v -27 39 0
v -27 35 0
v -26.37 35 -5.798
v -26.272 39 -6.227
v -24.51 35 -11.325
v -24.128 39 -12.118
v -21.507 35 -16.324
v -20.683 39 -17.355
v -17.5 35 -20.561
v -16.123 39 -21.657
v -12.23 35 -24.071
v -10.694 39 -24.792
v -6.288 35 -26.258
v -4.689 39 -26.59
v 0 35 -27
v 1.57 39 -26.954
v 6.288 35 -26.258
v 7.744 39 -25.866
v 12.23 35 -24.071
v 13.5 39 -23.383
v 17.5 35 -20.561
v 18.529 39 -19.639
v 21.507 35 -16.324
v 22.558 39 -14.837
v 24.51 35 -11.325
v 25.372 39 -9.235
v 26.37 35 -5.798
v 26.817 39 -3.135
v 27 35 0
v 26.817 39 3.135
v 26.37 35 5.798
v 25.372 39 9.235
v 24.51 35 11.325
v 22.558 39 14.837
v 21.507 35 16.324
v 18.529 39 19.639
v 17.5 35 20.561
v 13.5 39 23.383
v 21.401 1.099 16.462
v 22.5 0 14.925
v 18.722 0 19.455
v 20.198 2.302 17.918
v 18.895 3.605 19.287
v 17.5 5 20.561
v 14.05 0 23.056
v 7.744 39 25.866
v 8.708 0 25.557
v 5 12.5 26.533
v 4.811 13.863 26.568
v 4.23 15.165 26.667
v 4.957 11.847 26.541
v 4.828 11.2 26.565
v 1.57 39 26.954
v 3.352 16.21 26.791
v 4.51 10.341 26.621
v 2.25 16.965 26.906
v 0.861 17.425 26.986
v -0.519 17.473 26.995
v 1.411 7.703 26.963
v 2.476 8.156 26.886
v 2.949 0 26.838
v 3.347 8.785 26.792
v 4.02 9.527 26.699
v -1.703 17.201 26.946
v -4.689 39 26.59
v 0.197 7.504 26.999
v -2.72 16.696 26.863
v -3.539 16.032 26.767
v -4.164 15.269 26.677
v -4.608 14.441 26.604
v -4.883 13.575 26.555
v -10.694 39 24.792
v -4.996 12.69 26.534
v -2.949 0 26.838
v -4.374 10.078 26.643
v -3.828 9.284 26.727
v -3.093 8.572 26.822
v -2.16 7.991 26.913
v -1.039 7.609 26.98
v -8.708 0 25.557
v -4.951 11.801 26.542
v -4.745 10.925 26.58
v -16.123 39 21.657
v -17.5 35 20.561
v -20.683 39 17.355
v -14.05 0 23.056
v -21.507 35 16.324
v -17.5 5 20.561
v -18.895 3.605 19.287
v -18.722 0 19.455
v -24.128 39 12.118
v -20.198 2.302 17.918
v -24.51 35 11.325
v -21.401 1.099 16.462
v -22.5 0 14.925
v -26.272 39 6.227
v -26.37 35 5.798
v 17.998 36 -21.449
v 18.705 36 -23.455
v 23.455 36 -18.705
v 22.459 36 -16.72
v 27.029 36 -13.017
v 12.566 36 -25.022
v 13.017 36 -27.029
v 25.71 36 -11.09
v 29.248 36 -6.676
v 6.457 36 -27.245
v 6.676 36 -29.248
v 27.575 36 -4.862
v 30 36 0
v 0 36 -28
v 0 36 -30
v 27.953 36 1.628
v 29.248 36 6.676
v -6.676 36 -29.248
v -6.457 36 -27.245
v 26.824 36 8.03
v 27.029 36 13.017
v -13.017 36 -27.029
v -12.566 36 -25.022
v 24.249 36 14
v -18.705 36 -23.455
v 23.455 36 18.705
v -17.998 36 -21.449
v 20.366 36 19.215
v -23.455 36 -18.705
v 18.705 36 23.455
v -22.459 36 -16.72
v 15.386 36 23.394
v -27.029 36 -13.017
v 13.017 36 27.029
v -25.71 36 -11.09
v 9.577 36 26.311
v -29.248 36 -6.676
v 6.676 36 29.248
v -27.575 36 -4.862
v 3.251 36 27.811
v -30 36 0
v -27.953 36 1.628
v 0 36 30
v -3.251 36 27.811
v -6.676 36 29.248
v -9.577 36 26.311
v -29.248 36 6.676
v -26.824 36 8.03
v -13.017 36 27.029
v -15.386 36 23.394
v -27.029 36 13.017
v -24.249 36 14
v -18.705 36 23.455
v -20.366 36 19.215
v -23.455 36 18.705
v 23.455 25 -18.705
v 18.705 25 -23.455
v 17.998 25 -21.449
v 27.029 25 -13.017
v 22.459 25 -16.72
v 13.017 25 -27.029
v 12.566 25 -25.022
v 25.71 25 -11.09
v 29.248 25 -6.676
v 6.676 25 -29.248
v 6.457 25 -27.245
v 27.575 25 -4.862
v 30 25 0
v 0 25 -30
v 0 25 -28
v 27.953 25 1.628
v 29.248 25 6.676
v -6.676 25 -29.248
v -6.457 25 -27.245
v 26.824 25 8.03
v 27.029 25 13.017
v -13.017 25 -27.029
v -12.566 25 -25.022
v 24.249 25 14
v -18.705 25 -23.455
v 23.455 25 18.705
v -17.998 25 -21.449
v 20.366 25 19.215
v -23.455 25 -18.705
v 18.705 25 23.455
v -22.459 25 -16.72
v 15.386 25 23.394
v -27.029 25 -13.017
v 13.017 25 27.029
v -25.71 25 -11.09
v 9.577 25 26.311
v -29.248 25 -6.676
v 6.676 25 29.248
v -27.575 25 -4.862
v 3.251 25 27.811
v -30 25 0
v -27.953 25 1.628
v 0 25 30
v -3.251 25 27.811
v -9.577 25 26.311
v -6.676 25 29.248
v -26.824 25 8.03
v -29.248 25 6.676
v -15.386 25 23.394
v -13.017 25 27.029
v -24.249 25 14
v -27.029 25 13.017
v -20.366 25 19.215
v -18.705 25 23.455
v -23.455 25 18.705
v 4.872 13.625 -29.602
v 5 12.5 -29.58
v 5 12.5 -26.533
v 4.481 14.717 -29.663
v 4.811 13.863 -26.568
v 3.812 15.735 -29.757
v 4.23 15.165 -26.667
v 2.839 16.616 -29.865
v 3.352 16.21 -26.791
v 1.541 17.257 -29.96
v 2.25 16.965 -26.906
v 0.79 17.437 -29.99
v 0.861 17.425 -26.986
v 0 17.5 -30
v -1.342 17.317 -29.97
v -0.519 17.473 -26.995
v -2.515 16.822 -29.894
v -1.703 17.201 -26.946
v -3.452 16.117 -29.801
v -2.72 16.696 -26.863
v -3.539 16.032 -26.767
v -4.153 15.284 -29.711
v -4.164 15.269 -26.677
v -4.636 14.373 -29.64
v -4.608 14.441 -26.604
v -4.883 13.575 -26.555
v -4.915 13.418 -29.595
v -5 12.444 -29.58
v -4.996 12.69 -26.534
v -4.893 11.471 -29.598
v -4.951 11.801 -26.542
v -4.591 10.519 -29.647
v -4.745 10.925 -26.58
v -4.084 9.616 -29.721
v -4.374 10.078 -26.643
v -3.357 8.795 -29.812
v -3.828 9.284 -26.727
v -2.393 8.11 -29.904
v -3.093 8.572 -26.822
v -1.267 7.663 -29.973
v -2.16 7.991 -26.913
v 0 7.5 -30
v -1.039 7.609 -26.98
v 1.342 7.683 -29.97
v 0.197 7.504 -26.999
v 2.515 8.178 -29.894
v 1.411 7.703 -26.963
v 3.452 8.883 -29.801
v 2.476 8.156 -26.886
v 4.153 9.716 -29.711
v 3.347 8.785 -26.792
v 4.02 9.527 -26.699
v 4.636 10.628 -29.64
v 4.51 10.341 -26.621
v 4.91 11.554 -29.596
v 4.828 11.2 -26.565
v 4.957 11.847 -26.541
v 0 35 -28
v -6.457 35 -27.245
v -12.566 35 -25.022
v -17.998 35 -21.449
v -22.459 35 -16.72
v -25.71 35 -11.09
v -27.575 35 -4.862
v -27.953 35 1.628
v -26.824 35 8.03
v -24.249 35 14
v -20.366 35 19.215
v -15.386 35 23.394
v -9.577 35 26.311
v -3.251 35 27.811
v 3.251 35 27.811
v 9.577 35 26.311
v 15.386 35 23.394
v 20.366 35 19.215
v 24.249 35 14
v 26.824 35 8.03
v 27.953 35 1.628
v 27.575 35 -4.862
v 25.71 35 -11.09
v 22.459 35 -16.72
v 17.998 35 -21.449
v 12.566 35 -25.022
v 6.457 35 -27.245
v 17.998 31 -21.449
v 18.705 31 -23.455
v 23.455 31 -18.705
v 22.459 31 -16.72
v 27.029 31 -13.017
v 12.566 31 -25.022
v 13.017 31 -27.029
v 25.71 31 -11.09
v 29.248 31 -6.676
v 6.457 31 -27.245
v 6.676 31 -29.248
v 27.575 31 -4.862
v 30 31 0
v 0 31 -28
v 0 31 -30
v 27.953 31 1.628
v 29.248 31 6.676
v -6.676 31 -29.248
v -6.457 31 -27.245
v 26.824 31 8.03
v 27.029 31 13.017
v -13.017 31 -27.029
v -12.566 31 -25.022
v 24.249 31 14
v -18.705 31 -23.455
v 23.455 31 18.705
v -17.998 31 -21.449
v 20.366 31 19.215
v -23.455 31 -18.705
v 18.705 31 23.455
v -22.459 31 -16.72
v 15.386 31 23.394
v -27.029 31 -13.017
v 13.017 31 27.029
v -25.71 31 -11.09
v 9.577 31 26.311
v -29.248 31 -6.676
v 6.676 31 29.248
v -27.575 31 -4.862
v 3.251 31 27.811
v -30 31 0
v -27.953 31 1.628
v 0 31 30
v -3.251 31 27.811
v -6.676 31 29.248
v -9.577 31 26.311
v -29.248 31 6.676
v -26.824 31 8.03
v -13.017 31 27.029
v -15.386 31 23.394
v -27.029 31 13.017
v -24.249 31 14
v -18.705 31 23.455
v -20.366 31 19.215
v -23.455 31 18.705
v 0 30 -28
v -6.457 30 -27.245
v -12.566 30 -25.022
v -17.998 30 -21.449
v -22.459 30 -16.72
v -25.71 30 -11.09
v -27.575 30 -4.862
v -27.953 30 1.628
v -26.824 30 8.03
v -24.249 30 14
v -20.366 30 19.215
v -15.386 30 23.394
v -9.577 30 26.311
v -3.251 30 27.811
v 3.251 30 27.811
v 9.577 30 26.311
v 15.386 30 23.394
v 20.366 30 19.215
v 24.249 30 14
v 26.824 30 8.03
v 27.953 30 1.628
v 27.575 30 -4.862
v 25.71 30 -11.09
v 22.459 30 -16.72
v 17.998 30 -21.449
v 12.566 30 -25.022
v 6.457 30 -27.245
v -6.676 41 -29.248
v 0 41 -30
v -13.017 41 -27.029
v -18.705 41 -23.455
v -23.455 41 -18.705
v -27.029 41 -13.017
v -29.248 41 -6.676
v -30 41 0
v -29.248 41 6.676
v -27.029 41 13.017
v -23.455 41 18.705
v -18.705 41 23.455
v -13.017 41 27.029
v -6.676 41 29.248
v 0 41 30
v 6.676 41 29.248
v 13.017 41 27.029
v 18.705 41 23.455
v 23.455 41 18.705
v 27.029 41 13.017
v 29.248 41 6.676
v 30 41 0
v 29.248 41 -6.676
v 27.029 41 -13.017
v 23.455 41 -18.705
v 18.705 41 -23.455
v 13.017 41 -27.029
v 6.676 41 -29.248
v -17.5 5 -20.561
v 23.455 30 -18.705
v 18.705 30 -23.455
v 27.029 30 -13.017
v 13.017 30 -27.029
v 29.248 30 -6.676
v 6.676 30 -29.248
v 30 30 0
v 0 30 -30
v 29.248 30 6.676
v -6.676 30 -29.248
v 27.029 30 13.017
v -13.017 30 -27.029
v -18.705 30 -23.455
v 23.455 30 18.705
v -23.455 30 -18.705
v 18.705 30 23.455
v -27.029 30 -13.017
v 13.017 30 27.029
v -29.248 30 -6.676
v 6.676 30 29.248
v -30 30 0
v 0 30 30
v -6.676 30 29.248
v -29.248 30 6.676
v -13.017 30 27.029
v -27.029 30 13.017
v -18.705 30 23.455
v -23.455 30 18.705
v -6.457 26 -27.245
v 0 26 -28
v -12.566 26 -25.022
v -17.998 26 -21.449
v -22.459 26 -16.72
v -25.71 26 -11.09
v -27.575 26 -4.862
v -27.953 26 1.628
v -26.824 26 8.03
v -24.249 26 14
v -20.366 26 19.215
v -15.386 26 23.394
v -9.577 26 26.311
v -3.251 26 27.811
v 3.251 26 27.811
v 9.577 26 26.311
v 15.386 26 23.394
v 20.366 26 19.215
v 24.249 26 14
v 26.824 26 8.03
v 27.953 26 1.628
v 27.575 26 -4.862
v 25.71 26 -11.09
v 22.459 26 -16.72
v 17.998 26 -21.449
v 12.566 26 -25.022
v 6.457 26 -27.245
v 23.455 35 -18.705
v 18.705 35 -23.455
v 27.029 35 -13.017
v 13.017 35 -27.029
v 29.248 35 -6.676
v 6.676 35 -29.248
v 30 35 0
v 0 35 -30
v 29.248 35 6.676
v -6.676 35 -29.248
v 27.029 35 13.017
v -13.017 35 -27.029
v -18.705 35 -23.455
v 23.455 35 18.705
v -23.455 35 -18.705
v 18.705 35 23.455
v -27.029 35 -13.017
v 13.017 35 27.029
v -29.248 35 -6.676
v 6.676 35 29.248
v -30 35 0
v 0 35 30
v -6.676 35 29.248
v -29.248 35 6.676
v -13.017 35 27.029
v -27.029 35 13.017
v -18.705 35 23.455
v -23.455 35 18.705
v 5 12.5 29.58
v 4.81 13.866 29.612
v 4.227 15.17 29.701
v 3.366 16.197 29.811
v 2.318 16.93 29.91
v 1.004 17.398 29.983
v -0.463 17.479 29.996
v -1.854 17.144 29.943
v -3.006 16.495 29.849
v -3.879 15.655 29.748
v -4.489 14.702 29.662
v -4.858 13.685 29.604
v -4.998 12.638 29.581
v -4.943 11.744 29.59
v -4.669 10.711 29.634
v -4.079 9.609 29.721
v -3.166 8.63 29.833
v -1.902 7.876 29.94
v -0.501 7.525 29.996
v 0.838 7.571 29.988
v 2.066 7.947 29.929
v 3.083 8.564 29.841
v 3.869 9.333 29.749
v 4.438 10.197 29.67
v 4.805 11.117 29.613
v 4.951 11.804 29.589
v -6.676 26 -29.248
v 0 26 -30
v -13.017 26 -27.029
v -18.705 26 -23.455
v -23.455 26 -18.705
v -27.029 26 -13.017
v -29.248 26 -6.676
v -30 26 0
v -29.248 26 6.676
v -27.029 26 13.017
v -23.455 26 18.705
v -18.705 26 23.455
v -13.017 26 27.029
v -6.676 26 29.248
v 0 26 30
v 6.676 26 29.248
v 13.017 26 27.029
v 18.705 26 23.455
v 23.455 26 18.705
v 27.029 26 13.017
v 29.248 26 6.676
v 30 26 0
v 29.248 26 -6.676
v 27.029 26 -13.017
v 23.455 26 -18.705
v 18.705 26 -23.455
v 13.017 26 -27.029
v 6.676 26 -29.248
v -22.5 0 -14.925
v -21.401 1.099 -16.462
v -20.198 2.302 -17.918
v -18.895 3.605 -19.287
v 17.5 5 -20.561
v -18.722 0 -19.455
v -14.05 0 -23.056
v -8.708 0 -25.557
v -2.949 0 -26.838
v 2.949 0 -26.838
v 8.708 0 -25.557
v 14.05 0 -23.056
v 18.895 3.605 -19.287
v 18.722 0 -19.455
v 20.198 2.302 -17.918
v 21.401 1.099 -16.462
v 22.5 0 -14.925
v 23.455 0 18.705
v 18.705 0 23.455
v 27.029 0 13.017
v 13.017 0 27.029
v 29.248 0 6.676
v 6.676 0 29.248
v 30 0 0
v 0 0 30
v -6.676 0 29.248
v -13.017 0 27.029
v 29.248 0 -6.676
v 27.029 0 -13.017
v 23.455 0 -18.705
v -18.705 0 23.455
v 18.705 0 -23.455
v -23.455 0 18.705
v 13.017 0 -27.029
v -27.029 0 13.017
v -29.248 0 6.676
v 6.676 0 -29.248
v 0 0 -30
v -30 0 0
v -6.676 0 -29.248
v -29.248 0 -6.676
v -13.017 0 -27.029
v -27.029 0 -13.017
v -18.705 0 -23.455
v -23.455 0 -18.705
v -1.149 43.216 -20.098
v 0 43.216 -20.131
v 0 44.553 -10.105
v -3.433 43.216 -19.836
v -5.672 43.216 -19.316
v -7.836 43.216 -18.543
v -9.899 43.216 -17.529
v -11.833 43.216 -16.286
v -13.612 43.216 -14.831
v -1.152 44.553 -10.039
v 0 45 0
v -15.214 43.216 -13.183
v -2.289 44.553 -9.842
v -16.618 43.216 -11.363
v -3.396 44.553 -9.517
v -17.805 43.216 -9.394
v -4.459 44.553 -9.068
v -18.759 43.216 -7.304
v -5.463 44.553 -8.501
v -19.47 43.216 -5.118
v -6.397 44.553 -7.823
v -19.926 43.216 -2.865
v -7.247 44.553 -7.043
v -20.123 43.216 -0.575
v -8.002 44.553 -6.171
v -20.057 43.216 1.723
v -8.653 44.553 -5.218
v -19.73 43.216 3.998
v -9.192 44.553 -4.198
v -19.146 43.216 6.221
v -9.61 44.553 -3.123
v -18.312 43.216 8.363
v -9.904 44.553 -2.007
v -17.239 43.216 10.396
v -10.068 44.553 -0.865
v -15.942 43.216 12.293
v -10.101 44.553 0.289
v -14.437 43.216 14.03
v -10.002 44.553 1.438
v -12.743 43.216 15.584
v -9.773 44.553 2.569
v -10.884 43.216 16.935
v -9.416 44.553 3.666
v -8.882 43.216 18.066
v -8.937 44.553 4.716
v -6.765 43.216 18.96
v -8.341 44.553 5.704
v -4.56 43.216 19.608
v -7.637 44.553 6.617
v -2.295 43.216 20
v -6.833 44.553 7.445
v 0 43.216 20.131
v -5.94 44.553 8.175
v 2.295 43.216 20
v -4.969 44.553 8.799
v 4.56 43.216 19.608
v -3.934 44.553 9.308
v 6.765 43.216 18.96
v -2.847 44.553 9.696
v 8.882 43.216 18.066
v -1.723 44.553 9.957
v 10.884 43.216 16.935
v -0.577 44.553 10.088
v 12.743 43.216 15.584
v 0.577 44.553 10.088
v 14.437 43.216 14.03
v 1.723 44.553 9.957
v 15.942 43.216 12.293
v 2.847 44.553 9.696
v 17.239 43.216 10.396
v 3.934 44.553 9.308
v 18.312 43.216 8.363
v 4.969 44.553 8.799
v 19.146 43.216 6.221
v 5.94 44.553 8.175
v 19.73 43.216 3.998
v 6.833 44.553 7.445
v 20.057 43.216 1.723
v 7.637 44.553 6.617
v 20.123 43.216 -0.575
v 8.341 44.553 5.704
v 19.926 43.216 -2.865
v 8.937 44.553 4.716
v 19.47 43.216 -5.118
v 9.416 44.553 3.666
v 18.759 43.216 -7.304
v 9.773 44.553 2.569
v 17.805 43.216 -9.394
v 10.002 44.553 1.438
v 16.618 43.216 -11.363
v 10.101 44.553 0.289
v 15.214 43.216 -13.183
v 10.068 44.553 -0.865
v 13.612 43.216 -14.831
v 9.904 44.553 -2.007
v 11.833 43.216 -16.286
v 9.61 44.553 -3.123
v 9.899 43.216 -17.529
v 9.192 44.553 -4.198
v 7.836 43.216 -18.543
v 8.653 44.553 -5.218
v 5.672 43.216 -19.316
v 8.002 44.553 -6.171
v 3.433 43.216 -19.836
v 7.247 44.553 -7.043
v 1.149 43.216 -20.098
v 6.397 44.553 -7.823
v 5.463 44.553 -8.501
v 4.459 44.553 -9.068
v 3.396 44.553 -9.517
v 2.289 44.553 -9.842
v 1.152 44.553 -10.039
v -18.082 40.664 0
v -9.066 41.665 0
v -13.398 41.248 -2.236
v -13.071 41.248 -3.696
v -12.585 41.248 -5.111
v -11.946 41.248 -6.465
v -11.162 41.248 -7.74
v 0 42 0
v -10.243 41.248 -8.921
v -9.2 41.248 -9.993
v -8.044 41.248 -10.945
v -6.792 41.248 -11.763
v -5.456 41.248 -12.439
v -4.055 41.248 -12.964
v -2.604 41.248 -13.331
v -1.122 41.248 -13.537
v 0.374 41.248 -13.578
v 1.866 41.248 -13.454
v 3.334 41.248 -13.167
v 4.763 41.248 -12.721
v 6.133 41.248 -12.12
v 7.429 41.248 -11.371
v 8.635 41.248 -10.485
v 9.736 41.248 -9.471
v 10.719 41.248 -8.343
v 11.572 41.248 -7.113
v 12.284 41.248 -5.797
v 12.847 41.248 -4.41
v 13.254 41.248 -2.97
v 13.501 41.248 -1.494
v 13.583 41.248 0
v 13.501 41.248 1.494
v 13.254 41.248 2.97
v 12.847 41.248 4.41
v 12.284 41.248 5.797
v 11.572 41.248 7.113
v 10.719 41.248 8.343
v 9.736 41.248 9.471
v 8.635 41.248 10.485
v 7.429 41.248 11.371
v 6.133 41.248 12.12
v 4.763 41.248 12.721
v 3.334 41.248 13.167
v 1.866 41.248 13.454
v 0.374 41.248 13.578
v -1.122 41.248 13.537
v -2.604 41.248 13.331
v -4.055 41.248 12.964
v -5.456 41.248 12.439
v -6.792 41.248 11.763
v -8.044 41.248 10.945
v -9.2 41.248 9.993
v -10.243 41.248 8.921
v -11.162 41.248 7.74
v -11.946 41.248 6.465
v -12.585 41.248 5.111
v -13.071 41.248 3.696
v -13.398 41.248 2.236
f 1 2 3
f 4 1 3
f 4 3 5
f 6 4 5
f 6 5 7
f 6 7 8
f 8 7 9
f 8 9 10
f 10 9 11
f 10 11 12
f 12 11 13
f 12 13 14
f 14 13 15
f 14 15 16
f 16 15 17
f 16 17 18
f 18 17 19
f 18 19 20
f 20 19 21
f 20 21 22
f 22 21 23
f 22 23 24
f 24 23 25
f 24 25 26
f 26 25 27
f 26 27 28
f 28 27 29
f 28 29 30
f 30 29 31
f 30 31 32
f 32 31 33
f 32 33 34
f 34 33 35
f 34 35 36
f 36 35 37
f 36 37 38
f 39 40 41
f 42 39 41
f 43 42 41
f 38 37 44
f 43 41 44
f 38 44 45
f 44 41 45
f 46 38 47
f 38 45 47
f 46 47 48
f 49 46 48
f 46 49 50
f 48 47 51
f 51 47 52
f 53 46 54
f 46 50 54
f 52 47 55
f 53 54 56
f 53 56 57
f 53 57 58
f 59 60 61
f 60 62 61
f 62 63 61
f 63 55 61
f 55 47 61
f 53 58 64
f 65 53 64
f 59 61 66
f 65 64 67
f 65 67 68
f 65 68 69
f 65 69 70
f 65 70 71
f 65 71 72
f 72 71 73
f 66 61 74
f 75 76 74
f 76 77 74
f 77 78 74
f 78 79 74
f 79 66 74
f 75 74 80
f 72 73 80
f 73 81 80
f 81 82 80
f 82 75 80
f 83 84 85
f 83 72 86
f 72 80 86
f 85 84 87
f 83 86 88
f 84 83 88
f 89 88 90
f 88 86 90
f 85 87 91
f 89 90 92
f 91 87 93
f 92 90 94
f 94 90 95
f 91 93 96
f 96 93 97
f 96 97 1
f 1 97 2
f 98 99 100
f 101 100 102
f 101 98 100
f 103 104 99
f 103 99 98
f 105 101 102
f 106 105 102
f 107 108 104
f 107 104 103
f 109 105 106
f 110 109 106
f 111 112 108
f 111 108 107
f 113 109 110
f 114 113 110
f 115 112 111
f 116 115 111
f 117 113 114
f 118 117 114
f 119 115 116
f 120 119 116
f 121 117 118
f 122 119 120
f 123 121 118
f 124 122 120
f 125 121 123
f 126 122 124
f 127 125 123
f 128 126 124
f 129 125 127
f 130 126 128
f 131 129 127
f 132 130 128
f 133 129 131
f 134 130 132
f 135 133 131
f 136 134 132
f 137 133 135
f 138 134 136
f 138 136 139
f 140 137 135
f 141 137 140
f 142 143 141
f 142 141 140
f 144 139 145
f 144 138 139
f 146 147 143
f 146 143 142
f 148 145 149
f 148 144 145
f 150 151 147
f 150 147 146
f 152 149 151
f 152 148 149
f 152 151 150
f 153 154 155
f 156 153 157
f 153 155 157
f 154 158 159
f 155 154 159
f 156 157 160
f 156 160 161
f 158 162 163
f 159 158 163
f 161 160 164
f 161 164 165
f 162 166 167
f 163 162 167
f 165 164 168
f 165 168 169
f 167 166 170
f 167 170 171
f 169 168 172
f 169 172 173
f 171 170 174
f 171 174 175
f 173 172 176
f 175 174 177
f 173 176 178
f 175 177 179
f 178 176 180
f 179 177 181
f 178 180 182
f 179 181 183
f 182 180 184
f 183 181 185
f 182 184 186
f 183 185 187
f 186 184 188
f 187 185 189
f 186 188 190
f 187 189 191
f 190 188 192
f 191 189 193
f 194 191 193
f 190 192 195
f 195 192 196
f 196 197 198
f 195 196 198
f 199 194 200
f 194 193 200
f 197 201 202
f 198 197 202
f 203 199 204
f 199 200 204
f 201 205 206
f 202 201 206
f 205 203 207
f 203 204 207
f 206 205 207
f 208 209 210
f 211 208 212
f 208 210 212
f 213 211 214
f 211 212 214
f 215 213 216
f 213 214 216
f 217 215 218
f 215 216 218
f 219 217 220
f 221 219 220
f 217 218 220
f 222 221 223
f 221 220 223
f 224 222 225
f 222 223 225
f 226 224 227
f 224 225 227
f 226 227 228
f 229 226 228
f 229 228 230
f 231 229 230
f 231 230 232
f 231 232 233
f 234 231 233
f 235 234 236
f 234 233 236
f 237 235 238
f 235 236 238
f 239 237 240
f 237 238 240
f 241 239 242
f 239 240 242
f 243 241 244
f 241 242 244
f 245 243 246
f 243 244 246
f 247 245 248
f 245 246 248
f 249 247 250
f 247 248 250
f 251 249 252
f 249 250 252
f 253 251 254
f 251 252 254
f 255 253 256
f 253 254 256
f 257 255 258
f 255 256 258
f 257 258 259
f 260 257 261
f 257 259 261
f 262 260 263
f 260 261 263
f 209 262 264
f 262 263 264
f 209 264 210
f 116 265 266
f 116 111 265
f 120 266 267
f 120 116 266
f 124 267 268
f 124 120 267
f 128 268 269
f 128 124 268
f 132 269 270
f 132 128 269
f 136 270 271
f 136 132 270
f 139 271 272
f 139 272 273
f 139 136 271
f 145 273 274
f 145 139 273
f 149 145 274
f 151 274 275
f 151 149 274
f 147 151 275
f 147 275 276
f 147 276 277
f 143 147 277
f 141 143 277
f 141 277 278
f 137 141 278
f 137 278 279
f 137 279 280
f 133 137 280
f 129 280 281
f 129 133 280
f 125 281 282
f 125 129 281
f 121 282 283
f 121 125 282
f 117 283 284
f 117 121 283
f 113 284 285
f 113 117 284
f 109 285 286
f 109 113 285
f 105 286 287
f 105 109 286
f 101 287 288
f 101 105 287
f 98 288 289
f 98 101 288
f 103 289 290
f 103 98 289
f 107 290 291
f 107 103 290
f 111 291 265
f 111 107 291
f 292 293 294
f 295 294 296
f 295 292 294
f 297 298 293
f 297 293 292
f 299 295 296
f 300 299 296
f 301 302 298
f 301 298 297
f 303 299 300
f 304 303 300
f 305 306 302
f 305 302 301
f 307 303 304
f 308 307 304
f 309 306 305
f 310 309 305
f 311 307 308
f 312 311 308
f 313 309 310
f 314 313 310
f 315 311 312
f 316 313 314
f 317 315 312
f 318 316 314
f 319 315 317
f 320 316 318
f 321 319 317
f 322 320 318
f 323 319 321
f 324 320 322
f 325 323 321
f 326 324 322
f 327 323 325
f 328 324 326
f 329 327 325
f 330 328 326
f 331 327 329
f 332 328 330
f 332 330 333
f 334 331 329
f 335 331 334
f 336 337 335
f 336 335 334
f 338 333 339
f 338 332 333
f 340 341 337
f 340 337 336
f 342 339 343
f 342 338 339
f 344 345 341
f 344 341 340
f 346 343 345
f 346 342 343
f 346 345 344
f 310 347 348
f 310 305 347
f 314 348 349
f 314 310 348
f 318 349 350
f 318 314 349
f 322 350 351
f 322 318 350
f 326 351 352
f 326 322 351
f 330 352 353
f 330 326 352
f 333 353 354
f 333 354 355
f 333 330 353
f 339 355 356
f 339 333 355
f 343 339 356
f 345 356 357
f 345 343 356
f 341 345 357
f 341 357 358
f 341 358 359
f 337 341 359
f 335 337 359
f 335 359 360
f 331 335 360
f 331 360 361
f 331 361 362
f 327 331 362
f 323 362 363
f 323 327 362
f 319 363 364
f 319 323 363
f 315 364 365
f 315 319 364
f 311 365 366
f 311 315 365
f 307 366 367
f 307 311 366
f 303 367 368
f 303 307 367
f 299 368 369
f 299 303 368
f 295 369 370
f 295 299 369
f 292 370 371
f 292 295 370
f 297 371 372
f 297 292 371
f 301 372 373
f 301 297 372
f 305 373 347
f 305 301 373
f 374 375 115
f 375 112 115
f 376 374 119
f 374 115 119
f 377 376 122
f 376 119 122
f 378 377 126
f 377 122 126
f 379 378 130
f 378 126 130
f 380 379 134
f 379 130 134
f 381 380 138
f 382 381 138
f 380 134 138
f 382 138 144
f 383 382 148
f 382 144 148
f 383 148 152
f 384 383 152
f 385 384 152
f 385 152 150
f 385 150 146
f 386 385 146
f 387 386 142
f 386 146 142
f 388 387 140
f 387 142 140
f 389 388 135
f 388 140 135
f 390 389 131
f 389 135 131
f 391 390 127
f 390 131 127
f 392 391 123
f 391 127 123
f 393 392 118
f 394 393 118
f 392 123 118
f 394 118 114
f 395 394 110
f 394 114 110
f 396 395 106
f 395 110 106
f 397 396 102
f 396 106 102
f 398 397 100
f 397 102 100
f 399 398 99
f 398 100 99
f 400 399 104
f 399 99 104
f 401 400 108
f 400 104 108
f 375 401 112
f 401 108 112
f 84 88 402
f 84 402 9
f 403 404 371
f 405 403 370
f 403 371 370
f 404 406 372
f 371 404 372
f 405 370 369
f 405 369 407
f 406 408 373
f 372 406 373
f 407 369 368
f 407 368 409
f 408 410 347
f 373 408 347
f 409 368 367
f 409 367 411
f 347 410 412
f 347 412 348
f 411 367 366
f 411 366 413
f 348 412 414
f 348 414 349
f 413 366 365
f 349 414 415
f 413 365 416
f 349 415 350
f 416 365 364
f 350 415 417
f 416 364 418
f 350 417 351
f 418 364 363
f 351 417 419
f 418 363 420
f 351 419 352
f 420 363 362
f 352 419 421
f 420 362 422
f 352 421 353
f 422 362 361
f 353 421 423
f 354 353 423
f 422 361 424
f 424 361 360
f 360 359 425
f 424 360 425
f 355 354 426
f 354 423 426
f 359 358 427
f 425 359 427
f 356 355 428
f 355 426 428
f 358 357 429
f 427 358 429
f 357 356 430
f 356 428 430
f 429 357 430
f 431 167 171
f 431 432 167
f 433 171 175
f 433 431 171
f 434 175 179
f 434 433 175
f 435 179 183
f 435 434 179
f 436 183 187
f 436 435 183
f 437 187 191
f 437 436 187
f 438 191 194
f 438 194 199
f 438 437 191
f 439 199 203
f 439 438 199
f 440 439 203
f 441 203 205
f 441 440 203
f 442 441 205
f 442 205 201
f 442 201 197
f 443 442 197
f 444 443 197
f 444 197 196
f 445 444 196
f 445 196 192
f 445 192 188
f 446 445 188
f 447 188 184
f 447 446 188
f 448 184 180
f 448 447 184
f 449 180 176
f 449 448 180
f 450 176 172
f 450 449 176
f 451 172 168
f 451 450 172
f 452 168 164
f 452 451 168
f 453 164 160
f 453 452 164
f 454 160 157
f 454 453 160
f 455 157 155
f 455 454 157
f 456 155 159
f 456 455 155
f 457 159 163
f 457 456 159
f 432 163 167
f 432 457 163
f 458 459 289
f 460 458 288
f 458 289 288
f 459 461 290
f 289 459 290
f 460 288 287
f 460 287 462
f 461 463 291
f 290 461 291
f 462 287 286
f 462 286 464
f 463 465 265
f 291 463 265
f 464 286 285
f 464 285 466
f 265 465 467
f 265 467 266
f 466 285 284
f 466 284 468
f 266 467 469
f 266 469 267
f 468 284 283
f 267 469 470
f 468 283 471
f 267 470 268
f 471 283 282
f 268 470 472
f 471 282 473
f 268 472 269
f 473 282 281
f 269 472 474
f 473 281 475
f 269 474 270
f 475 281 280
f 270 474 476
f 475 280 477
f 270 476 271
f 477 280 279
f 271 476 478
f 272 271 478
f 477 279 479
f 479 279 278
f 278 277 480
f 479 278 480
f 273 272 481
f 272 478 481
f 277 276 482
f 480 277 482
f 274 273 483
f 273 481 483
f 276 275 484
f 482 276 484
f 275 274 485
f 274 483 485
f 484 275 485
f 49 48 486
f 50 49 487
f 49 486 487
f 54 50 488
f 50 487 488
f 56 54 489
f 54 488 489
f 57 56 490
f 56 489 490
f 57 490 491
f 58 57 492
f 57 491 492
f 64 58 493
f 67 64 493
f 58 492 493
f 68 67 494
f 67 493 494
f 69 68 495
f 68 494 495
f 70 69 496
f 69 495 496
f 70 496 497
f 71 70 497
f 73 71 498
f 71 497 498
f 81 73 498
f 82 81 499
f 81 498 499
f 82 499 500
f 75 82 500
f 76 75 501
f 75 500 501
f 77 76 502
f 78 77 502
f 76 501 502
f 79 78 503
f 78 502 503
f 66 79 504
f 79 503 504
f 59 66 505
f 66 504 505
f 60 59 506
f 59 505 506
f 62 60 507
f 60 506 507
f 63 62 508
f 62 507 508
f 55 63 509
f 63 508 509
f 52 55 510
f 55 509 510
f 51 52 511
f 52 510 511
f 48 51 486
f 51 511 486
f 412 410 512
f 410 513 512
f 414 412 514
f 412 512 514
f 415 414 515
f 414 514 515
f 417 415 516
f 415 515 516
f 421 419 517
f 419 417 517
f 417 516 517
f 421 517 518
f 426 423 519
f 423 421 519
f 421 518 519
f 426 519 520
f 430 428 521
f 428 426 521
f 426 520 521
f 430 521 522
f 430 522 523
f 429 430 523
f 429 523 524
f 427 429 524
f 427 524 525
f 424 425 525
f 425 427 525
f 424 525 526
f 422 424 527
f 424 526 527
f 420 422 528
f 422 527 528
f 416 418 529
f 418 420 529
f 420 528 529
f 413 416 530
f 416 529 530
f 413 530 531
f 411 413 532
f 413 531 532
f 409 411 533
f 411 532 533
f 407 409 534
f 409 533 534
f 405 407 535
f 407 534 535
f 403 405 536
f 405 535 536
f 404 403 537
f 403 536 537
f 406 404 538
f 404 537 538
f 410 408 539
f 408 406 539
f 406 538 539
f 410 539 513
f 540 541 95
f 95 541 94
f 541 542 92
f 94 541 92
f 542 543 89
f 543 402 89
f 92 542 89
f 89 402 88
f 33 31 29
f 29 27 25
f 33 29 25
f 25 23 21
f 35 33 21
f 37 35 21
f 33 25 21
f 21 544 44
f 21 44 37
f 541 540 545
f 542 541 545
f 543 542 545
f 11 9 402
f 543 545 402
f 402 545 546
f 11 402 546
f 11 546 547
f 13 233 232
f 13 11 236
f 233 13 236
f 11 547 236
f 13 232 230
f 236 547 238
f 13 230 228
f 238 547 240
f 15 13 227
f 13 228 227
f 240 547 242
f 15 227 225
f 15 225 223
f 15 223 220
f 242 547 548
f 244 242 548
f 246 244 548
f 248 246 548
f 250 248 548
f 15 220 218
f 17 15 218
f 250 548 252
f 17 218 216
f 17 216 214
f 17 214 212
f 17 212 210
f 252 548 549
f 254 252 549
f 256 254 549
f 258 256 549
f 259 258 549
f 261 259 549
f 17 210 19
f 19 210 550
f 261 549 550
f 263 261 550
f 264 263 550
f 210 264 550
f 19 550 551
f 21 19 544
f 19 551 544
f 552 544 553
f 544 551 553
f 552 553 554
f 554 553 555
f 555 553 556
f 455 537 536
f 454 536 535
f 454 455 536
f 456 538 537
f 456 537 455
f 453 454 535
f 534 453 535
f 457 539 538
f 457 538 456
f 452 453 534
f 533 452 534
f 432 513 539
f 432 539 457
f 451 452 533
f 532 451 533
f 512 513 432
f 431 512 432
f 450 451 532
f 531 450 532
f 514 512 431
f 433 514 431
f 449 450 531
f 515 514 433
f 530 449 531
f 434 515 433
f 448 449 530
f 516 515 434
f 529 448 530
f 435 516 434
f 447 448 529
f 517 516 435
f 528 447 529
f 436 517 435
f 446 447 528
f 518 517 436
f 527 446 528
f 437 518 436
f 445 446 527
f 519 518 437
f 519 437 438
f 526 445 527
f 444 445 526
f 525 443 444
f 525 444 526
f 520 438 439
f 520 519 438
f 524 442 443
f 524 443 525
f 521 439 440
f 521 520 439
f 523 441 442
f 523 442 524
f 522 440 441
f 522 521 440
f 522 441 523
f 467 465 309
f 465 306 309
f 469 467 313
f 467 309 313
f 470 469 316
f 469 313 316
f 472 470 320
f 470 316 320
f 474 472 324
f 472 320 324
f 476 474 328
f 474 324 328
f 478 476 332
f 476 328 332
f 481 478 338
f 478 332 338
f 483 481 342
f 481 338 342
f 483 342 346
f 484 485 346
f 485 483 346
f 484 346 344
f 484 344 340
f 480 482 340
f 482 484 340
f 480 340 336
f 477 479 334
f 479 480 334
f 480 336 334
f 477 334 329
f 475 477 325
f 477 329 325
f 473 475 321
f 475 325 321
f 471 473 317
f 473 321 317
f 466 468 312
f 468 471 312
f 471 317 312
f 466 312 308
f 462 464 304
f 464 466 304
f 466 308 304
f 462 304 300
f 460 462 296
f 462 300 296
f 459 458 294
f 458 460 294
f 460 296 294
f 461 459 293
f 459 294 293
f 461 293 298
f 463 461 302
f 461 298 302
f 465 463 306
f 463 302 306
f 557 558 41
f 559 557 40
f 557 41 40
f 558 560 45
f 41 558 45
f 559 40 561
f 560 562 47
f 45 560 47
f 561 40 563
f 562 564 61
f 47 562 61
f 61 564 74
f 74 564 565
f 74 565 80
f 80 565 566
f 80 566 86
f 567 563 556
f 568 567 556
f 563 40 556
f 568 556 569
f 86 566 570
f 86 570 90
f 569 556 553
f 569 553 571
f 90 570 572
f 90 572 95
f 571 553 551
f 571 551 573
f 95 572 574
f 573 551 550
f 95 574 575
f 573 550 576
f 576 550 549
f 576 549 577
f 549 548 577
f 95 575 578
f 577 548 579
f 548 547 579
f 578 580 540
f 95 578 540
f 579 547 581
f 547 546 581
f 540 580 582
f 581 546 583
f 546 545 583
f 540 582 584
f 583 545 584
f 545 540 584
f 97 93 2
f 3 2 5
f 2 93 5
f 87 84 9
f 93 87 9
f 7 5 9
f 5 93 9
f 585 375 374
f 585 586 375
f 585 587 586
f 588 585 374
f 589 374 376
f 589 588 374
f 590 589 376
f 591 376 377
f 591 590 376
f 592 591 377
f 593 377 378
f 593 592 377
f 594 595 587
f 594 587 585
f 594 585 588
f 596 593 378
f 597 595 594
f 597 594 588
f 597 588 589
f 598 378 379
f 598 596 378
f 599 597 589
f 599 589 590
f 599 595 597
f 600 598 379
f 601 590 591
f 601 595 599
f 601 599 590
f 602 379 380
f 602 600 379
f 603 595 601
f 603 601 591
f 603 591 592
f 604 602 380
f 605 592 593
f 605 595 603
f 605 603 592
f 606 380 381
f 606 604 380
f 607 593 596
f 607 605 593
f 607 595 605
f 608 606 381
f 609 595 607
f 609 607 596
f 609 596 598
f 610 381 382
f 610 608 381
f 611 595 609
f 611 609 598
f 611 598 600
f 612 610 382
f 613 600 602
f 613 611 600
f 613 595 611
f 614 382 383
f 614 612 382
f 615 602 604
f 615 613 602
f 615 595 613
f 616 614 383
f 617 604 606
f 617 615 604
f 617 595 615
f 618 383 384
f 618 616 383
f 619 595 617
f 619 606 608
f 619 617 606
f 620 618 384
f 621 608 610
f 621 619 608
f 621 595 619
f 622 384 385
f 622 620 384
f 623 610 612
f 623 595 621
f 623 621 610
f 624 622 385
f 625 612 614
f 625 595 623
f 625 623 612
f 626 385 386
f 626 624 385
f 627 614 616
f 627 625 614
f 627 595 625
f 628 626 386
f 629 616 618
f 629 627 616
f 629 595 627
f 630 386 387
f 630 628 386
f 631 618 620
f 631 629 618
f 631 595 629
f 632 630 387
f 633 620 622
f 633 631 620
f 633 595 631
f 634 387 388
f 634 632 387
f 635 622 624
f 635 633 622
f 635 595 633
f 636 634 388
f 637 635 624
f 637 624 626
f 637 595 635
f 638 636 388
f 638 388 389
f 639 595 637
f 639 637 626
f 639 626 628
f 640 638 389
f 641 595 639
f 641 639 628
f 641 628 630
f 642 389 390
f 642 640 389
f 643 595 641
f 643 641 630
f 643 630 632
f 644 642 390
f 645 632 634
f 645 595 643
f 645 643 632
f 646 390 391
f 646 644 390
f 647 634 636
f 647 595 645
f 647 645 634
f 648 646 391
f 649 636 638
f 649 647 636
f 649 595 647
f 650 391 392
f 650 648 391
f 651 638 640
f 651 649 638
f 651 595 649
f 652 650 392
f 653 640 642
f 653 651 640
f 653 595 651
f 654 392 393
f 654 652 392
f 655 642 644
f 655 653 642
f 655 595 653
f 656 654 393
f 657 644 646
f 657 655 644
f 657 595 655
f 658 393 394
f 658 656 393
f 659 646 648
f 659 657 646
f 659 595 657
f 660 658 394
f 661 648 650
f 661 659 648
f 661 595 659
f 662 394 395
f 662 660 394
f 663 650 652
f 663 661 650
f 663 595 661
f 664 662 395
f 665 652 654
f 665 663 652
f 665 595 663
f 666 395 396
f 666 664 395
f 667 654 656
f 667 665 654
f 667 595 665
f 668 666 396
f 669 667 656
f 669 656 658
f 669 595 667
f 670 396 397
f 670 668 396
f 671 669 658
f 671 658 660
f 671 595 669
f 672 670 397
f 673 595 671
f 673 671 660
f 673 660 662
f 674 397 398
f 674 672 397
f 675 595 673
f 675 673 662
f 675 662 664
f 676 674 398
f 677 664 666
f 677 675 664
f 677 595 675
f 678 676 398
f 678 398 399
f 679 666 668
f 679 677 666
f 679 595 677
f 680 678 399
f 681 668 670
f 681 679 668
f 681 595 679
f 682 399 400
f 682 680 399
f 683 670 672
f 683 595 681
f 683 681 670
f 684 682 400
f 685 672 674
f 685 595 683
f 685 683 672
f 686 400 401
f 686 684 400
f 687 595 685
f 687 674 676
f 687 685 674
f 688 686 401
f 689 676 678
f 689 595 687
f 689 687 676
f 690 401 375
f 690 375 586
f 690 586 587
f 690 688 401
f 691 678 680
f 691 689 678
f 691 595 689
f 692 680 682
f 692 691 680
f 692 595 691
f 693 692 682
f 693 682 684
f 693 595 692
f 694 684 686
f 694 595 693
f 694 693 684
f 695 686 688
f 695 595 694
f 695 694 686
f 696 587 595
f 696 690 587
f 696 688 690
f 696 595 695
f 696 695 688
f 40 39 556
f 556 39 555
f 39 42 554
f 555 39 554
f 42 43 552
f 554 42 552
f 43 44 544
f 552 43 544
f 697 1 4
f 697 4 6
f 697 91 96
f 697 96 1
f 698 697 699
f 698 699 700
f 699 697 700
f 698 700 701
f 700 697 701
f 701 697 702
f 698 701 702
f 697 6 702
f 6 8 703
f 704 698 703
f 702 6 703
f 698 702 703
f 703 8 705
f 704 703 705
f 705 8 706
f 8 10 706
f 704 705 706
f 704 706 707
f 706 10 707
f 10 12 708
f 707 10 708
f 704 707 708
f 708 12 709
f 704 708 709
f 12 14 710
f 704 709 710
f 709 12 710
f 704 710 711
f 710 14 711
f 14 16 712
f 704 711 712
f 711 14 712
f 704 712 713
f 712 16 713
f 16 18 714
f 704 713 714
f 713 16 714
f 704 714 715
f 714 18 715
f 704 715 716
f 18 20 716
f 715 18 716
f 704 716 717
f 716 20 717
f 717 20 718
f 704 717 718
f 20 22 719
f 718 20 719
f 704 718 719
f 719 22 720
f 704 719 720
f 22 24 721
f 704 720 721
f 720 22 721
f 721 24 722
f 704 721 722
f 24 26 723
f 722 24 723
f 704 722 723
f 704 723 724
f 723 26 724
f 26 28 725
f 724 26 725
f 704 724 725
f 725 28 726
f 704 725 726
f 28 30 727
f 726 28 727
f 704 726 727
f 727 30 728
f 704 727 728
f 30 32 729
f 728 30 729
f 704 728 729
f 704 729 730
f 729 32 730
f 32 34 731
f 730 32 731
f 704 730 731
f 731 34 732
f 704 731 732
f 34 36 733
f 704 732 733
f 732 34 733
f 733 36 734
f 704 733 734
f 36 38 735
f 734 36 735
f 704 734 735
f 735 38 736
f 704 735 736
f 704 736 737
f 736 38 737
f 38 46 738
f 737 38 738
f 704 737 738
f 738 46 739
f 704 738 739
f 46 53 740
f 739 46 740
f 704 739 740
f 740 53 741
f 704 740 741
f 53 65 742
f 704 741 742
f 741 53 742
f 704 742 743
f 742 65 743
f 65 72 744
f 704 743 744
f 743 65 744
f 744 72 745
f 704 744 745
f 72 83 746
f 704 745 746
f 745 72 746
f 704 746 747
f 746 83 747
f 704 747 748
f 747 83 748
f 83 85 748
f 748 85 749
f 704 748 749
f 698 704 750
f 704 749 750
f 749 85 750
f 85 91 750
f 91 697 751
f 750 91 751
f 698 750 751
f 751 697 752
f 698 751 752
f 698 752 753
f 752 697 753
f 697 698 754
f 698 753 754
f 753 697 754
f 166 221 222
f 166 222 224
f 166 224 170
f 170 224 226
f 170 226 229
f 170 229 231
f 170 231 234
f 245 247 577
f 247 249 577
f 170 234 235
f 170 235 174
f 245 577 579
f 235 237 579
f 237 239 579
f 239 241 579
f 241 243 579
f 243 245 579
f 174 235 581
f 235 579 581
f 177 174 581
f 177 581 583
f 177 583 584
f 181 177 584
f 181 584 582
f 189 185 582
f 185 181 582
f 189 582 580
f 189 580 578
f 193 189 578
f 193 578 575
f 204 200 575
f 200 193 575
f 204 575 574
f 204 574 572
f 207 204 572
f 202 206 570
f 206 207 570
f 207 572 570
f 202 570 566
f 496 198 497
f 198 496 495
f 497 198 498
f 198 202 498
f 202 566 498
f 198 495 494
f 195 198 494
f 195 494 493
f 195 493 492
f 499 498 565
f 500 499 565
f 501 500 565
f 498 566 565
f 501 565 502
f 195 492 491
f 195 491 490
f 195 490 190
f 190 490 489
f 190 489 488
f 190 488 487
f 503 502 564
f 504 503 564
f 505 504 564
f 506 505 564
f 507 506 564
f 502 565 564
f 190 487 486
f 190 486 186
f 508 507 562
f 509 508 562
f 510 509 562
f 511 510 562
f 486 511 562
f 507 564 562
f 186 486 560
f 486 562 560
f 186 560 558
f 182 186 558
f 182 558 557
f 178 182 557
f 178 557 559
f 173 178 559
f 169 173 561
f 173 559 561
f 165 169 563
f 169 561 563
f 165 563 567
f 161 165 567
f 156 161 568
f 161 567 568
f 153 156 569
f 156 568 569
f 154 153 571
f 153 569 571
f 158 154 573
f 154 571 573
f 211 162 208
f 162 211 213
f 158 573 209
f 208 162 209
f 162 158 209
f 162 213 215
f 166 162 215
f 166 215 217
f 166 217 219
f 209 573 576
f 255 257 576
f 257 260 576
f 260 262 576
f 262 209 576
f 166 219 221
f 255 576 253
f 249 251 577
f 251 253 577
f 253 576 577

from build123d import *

# Parameters (mm, degrees)
SKETCH1_R                           = 30
BOSS_EXTRUDE1_DEPTH                 = 45
SKETCH2_W                           = 4
SKETCH2_H                           = 1
SKETCH3_R                           = 5
CUT_EXTRUDE1_DEPTH                  = 62.846584384
CUT_EXTRUDE1_DEPTH_BACK             = 62.846584384
CUT_EXTRUDE3_REACH                  = 63.847
CUT_EXTRUDE3_END_RADIUS             = 27
SKETCH8_W                           = 35
SKETCH8_H                           = 70
CUT_EXTRUDE3_DIRECTION_2_REACH      = 63.847
CUT_EXTRUDE3_DIRECTION_2_END_RADIUS = 27
SKETCH9_W                           = 15
SKETCH9_H                           = 35
SKETCH9_H_2                         = 2
CHAMFER2_SIZE                       = 5


with BuildPart() as part:
    # Sketch1 → Boss-Extrude1 (new body)
    with BuildSketch(Plane(origin=(0, 0, 0), x_dir=(1, 0, 0), z_dir=(0, 1, 0))):
        with Locations(Location((0, 0, 0), (0, 0, 90))):
            Circle(SKETCH1_R)
    extrude(amount=BOSS_EXTRUDE1_DEPTH)

    # Sketch2 → Cut-Revolve3 (revolve, cut)
    with BuildSketch(Plane.XY, mode=Mode.PRIVATE) as cut_revolve3_sk:
        with Locations((30, 25.5)):
            Rectangle(SKETCH2_W, SKETCH2_H)
        with Locations((30, 30.5)):
            Rectangle(SKETCH2_W, SKETCH2_H)
        with Locations((30, 35.5)):
            Rectangle(SKETCH2_W, SKETCH2_H)
        with BuildLine():
            Line((0, 45), (0, 47.512456789))
            Line((0, 47.512456789), (33.213865232, 47.512456789))
            Line((33.213865232, 47.512456789), (30, 41))
            ThreePointArc((30, 41), (15.13274595, 43.995594628), (0, 45))
        make_face()
    revolve(cut_revolve3_sk.sketch.rotate(Axis((0, 0, 0), (0, 1, 0)), 90), axis=Axis((0, 0, 0), (0, 1, 0)), mode=Mode.SUBTRACT)

    # Sketch3 → Cut-Extrude1 (cut, two sides)
    with BuildSketch(Plane.XY) as cut_extrude1_sk:
        with Locations((0, 12.5)):
            Circle(SKETCH3_R)
    extrude(amount=CUT_EXTRUDE1_DEPTH, mode=Mode.SUBTRACT)
    extrude(cut_extrude1_sk.sketch, amount=-CUT_EXTRUDE1_DEPTH_BACK, mode=Mode.SUBTRACT)

    # Cut-Extrude3: up to this cylinder (the profile starts inside it)
    cut_extrude3_end = Plane(origin=(0, 0, 0), z_dir=(0, -1, 0)) * Cylinder(CUT_EXTRUDE3_END_RADIUS, 182.694, mode=Mode.PRIVATE)
    # Sketch8 → Cut-Extrude3 (cut, up to the surface)
    with BuildSketch(Plane.XY, mode=Mode.PRIVATE) as cut_extrude3_sk1:
        Rectangle(SKETCH8_W, SKETCH8_H)
    cut_extrude3_tool1 = extrude(cut_extrude3_sk1.sketch, amount=-CUT_EXTRUDE3_REACH, mode=Mode.PRIVATE) & cut_extrude3_end
    add(cut_extrude3_tool1.solids().sort_by_distance((0, 0, 0))[0], mode=Mode.SUBTRACT)

    # Cut-Extrude3 direction 2: up to this cylinder (the profile starts inside it)
    cut_extrude3_direction_2_end = Plane(origin=(0, 0, 0), z_dir=(0, -1, 0)) * Cylinder(CUT_EXTRUDE3_DIRECTION_2_END_RADIUS, 182.694, mode=Mode.PRIVATE)
    # Sketch8 → Cut-Extrude3 direction 2 (cut, up to the surface)
    with BuildSketch(Plane.XY, mode=Mode.PRIVATE) as cut_extrude3_direction_2_sk1:
        Rectangle(SKETCH8_W, SKETCH8_H)
    cut_extrude3_direction_2_tool1 = extrude(cut_extrude3_direction_2_sk1.sketch, amount=CUT_EXTRUDE3_DIRECTION_2_REACH, mode=Mode.PRIVATE) & cut_extrude3_direction_2_end
    add(cut_extrude3_direction_2_tool1.solids().sort_by_distance((0, 0, 0))[0], mode=Mode.SUBTRACT)

    # Sketch9 → Cut-Revolve4 (revolve, cut)
    with BuildSketch(Plane.XY):
        with Locations((-7.5, 17.5)):
            Rectangle(SKETCH9_W, SKETCH9_H)
        with Locations((-7.5, 36)):
            Rectangle(SKETCH9_W, SKETCH9_H_2)
        Polygon((-27, 35), (-15, 35), (-15, 37), (0, 37), (0, 39), (-27, 39), align=None)
        with BuildLine():
            ThreePointArc((0, 42), (-13.583077707, 41.247699365), (-27, 39))
            Line((-27, 39), (0, 39))
            Line((0, 39), (0, 42))
        make_face()
        with BuildLine():
            Line((0, 39), (27, 39))
            ThreePointArc((27, 39), (13.583077707, 41.247699365), (0, 42))
            Line((0, 42), (0, 39))
        make_face()
    revolve(axis=Axis((0, 0, 0), (0, -1, 0)), mode=Mode.SUBTRACT)

    # Chamfer2
    chamfer2_edges = [part.edges().sort_by_distance(p)[0] for p in [
        (17.5, 0, 0),
        (-17.5, 0, 0),
    ]]
    chamfer(chamfer2_edges, length=CHAMFER2_SIZE)


solid = part.part
